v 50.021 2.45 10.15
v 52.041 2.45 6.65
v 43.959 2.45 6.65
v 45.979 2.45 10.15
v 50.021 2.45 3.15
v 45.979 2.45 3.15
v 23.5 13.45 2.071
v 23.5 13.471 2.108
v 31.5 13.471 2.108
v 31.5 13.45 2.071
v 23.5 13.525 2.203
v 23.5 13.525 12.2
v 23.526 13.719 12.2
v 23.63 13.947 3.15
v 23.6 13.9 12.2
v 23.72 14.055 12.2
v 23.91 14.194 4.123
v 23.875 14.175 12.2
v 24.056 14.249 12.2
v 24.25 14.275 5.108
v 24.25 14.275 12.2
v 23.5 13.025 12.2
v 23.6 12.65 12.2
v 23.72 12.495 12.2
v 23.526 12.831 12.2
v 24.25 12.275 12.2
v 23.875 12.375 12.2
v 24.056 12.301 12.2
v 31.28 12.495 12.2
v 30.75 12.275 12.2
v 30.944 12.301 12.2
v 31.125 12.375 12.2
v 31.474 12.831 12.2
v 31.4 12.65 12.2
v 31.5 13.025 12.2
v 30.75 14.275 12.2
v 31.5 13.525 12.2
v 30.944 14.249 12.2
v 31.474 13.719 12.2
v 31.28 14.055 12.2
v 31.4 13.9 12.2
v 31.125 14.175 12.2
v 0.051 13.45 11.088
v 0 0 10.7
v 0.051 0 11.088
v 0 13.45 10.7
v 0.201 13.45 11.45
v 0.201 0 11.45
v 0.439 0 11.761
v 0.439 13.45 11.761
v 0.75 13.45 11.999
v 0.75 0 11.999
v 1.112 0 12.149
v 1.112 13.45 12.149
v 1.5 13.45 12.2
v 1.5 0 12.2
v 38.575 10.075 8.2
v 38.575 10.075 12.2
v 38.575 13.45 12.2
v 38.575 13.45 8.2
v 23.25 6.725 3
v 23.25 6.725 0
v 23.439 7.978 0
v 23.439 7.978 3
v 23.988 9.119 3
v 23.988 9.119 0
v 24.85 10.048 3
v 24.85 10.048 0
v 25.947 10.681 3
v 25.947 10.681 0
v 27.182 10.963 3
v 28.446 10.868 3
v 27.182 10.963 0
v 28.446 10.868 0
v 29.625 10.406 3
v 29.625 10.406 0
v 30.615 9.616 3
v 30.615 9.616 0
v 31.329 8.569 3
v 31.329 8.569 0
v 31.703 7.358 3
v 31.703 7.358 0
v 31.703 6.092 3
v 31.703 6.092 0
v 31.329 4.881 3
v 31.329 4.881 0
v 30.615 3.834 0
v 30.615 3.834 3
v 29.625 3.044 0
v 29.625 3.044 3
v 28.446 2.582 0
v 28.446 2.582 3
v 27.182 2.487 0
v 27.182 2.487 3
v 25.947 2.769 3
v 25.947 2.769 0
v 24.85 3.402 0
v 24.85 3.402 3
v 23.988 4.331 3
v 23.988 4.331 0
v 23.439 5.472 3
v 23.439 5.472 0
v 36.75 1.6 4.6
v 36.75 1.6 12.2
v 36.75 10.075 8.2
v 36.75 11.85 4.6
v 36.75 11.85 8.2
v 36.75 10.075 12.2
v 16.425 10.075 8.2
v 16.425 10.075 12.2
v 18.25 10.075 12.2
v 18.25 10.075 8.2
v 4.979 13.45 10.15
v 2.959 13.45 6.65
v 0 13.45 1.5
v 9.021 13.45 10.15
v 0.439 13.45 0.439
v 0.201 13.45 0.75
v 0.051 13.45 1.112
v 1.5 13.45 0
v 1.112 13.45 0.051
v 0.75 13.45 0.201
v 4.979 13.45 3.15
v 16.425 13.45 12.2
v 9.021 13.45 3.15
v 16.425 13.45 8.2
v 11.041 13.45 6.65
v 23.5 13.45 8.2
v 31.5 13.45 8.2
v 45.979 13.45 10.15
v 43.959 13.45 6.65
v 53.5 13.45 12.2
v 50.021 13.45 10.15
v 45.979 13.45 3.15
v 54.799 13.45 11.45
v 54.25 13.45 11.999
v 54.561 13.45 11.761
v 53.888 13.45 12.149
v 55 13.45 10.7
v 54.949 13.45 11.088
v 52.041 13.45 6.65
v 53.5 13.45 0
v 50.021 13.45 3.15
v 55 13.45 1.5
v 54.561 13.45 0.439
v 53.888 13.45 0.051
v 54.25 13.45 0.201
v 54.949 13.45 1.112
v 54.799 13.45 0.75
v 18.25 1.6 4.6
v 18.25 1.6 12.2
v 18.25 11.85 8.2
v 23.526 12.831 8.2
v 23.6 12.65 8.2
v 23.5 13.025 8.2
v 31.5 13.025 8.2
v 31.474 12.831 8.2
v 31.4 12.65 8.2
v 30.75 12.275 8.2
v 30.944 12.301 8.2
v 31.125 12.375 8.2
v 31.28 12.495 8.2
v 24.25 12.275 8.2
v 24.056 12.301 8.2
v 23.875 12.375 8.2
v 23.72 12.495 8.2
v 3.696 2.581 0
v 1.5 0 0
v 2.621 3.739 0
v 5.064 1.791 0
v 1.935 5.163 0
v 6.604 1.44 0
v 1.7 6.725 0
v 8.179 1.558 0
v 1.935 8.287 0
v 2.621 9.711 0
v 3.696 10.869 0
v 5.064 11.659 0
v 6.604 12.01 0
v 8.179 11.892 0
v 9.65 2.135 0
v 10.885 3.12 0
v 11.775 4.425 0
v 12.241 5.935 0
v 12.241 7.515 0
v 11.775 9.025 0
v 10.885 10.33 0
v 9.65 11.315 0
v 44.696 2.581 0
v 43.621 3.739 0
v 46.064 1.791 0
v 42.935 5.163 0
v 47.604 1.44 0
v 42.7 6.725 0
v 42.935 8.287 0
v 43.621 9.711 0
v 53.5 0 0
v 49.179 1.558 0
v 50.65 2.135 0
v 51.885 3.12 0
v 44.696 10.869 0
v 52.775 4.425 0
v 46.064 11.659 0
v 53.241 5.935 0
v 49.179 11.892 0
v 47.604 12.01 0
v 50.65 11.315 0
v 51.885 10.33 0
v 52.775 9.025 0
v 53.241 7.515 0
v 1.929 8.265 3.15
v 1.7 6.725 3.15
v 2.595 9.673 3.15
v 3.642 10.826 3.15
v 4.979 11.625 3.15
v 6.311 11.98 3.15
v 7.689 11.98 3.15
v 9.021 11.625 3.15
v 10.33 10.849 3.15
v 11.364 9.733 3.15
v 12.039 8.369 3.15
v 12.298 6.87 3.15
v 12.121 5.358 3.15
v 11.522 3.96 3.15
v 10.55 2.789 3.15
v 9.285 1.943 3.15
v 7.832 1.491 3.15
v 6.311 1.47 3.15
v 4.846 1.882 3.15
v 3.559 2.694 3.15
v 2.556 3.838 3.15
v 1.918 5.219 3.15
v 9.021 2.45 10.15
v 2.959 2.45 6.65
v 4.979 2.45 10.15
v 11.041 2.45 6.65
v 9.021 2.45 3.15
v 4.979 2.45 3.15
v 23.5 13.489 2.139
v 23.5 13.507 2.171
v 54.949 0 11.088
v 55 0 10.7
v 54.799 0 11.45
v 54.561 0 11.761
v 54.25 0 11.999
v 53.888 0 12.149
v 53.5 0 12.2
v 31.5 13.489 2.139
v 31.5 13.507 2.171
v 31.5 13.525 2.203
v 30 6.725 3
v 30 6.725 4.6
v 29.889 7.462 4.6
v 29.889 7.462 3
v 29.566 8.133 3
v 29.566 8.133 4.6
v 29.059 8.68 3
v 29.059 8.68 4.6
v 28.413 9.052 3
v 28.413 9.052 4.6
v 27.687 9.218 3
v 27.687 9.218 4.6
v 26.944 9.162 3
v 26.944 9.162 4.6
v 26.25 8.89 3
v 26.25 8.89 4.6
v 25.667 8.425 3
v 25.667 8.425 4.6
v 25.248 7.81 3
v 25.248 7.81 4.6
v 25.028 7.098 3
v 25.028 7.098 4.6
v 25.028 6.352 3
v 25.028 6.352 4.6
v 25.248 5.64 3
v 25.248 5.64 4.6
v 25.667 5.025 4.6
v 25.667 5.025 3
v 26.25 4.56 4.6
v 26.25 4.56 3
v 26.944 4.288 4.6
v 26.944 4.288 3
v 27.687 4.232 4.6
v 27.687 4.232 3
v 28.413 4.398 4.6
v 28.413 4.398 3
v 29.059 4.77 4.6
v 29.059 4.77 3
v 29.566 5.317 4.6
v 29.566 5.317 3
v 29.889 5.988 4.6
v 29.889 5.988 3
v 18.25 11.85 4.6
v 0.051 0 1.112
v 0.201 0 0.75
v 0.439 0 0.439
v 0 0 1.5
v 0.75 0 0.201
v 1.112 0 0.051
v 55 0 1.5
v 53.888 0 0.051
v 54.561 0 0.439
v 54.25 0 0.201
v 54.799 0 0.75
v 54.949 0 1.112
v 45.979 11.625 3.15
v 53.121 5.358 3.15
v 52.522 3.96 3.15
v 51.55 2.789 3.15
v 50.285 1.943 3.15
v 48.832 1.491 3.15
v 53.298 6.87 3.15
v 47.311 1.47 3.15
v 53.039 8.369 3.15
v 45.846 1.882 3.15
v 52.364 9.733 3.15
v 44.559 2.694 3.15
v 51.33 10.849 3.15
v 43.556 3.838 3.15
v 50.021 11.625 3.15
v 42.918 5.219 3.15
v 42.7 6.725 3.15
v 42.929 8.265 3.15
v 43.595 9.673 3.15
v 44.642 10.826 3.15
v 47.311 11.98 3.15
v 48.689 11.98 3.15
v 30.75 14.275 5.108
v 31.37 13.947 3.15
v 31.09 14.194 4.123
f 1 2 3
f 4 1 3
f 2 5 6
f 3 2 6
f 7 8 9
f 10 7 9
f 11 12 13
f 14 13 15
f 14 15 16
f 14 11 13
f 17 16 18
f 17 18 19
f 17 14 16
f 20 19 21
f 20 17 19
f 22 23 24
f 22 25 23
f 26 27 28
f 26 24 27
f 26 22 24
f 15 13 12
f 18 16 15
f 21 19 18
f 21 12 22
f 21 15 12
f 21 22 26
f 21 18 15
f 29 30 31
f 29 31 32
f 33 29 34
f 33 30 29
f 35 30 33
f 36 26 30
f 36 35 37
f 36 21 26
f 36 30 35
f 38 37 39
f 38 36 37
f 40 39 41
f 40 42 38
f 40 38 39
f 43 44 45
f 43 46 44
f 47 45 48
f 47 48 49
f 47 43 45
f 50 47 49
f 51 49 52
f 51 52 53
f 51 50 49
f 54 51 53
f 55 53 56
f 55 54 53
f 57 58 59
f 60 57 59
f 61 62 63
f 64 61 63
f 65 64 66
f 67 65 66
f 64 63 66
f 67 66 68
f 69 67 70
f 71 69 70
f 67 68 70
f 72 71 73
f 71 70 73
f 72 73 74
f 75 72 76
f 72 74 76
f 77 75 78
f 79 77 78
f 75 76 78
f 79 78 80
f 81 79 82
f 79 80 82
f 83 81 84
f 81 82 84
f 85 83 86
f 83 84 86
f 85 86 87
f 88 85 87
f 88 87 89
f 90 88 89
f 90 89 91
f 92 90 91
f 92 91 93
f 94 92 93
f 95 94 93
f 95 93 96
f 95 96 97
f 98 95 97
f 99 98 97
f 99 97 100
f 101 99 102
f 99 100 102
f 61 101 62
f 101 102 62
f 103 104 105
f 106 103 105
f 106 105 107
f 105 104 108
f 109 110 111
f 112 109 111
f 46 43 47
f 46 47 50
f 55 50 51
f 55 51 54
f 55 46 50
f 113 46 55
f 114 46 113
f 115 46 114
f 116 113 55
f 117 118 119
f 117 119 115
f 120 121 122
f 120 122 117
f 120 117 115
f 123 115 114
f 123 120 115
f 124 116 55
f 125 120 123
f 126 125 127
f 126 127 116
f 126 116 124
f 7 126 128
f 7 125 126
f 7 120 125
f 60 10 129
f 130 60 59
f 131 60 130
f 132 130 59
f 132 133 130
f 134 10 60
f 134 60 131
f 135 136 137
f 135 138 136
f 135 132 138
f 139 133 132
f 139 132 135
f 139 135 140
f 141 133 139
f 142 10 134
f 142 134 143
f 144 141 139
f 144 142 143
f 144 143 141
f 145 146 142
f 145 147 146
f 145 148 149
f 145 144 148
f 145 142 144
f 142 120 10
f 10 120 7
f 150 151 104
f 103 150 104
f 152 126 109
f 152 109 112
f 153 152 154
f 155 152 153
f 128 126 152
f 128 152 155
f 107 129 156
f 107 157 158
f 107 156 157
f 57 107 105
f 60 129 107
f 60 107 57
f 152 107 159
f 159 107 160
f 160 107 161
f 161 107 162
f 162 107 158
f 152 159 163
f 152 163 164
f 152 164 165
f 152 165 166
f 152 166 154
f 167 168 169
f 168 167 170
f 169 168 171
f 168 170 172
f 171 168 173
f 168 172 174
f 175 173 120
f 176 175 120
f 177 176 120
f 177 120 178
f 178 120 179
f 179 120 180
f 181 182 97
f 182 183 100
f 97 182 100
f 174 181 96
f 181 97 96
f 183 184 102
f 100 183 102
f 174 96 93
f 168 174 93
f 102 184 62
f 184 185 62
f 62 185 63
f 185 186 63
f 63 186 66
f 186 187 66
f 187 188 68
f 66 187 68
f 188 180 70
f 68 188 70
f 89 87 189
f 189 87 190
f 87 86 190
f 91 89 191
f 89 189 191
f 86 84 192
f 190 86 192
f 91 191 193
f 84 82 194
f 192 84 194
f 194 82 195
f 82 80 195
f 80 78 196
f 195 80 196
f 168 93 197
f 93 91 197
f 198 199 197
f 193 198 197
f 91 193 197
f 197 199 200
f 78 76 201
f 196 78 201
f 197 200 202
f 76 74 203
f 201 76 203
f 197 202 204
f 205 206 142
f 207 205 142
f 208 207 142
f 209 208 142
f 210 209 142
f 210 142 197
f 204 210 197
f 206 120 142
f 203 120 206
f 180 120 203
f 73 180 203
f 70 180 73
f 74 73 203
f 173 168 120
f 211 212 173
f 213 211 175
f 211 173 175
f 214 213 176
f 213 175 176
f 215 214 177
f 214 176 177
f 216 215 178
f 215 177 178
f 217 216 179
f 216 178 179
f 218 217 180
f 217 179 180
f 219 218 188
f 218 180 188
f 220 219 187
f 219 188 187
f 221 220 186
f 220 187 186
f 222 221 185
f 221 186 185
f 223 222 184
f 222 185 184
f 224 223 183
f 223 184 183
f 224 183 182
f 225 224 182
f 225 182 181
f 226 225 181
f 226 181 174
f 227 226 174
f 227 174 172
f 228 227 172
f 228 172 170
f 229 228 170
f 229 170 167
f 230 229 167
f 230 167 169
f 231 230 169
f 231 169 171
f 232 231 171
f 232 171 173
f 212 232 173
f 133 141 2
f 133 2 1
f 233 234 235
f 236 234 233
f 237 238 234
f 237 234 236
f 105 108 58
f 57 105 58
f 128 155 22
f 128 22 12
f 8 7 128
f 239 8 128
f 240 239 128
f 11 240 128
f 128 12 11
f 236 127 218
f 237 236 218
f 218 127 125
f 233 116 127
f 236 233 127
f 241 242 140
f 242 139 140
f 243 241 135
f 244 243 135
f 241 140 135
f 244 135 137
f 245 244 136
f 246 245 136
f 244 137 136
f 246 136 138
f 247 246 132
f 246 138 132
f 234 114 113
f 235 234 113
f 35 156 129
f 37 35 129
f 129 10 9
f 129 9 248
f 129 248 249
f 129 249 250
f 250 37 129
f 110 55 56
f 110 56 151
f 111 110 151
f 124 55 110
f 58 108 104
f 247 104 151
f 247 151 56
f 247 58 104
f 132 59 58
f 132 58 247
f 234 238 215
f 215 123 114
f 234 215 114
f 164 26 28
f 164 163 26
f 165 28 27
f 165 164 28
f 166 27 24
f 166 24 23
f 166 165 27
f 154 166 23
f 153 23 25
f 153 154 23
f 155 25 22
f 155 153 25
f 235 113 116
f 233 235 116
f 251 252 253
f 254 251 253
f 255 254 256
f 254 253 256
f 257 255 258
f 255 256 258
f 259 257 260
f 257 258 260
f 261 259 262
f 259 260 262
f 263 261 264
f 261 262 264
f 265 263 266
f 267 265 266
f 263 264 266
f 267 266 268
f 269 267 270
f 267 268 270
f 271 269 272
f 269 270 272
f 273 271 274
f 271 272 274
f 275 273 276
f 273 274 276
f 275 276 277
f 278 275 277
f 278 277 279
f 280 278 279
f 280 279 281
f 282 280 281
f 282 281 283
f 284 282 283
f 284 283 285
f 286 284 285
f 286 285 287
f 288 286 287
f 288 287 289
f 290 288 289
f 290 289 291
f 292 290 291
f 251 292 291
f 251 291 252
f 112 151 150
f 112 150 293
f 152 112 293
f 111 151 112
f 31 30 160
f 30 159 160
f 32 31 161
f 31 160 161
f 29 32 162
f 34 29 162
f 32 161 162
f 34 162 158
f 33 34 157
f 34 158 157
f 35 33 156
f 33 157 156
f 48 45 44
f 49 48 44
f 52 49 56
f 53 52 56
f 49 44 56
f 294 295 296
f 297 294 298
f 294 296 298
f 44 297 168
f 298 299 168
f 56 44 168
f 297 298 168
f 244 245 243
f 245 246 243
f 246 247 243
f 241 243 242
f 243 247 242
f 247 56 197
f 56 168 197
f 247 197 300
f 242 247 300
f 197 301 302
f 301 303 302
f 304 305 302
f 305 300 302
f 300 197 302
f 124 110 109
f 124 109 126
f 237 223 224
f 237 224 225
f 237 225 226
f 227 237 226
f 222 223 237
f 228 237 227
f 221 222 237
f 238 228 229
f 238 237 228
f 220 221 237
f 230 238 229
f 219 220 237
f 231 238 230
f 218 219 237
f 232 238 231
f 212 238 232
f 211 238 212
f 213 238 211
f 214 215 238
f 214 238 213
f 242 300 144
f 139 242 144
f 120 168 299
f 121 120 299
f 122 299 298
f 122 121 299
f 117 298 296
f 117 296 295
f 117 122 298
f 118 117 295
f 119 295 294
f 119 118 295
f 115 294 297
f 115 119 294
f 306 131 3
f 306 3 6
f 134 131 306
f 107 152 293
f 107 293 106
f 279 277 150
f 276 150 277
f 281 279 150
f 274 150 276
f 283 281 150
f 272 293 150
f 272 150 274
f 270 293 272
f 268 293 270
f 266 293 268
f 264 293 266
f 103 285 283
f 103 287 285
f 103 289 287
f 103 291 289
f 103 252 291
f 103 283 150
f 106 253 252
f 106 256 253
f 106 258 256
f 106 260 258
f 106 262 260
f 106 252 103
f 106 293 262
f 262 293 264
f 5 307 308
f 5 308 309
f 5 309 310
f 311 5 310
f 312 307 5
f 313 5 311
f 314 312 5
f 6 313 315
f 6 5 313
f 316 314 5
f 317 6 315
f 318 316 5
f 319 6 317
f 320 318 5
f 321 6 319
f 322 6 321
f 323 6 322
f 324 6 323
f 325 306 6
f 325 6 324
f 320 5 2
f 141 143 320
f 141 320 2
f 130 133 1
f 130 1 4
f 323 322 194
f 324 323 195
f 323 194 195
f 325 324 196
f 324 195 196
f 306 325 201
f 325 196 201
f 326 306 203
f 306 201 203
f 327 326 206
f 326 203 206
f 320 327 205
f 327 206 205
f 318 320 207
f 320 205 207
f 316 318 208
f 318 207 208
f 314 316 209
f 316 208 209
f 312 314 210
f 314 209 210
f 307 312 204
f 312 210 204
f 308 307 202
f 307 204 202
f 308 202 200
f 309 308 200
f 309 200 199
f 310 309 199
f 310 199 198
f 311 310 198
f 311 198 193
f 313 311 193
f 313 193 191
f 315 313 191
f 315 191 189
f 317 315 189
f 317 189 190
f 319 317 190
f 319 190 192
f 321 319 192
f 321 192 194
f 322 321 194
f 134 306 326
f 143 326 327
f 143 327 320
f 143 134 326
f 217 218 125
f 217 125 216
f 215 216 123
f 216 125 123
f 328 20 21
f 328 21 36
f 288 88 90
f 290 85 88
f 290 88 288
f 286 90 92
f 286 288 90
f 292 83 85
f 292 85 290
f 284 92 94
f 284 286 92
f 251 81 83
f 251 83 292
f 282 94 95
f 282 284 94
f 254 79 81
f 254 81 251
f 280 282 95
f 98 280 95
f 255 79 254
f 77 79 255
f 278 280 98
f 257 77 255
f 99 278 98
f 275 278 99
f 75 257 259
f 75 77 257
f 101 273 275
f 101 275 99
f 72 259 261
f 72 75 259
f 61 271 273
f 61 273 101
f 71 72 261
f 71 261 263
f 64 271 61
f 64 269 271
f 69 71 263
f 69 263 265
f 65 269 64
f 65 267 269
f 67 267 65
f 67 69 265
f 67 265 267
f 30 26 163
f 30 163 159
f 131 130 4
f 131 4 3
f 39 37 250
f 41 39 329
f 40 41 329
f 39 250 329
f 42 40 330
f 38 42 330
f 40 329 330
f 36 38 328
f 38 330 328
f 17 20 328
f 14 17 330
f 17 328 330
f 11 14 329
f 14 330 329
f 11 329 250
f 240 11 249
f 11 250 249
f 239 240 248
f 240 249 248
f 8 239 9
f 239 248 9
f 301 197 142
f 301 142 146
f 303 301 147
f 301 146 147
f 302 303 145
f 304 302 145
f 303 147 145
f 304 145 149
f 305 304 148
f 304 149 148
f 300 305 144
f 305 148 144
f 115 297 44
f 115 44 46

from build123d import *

# Parameters (mm, degrees)
SKETCH2_W           = 55
SKETCH2_H           = 13.45
BOSS_EXTRUDE1_DEPTH = 12.2
SKETCH3_W           = 18.5
SKETCH3_H           = 10.25
CUT_EXTRUDE1_DEPTH  = 7.6
SKETCH5_W           = 22.15
SKETCH5_H           = 1.6
CUT_EXTRUDE2_DEPTH  = 4
SKETCH6_W           = 8
SKETCH6_H           = 2
BOSS_EXTRUDE2_DEPTH = 8.7
SKETCH7_W           = 1.825
SKETCH7_H           = 3.375
CUT_EXTRUDE3_DEPTH  = 4
FILLET1_R           = 0.75
FILLET3_R           = 0.75
DRAFT4_ANGLE        = 60
FILLET5_R           = 6
SKETCH8_R           = 2.5
CUT_EXTRUDE4_DEPTH  = 58.328314378
SKETCH9_R           = 4.25
CUT_EXTRUDE5_DEPTH  = 3
SKETCH10_R          = 5.3
CUT_EXTRUDE6_DEPTH  = 3.15
CUT_EXTRUDE7_DEPTH  = 11
FILLET6_R           = 1.5


with BuildPart() as part:
    # Sketch2 → Boss-Extrude1 (new body)
    with BuildSketch(Plane.XY):
        with Locations((27.5, 6.725)):
            Rectangle(SKETCH2_W, SKETCH2_H)
    extrude(amount=BOSS_EXTRUDE1_DEPTH)

    # Sketch3 → Cut-Extrude1 (cut)
    with BuildSketch(Plane.XY.offset(12.2)):
        with Locations((27.5, 6.725)):
            Rectangle(SKETCH3_W, SKETCH3_H)
    extrude(amount=-CUT_EXTRUDE1_DEPTH, mode=Mode.SUBTRACT)

    # Sketch5 → Cut-Extrude2 (cut)
    with BuildSketch(Plane.XY.offset(12.2)):
        with Locations((27.5, 12.65)):
            Rectangle(SKETCH5_W, SKETCH5_H)
    extrude(amount=-CUT_EXTRUDE2_DEPTH, mode=Mode.SUBTRACT)

    # Sketch6 → Boss-Extrude2 (add)
    with BuildSketch(Plane.XY.offset(12.2)):
        with Locations((27.5, 13.275)):
            Rectangle(SKETCH6_W, SKETCH6_H)
    extrude(amount=-BOSS_EXTRUDE2_DEPTH)

    # Sketch7 → Cut-Extrude3 (cut)
    with BuildSketch(Plane.XY.offset(12.2)):
        with Locations((37.6625, 11.7625)):
            Rectangle(SKETCH7_W, SKETCH7_H)
        with Locations((17.3375, 11.7625)):
            Rectangle(SKETCH7_W, SKETCH7_H)
    extrude(amount=-CUT_EXTRUDE3_DEPTH, mode=Mode.SUBTRACT)

    # Fillet1
    fillet1_edges = [part.edges().sort_by_distance(p)[0] for p in [
        (31.5, 14.275, 7.85),
        (31.5, 12.275, 10.2),
    ]]
    fillet(fillet1_edges, radius=FILLET1_R)

    # Fillet3
    fillet3_edges = [part.edges().sort_by_distance(p)[0] for p in [
        (23.5, 12.275, 10.2),
        (23.5, 14.275, 7.85),
    ]]
    fillet(fillet3_edges, radius=FILLET3_R)

    # Draft4
    draft4_faces = [part.faces().sort_by_distance(p)[0] for p in [
        (27.5, 13.853198642, 3.5),
    ]]
    draft(draft4_faces, Plane(origin=(23.5, 14.275, 3.5), x_dir=(0, 0, 1), z_dir=(0, 1, 0)), DRAFT4_ANGLE)

    # Fillet5
    # the kernel refuses this fillet: 6 mm, written as the material it takes off along each edge
    with BuildSketch(Plane(origin=(34.769237886, 14.275, 3.5), x_dir=(0, -0.49999999999999784, -0.8660254037844399), z_dir=(-1, 0, 0))) as fillet5_piece_1:
        with BuildLine():
            CenterArc((FILLET5_R * 0.267949192431, FILLET5_R), FILLET5_R, 240, 30)
            Line((-FILLET5_R * 0.232050807569, FILLET5_R * 0.133974596216), (0, 0))
            Line((0, 0), (FILLET5_R * 0.267949192431, 0))
        make_face()
    extrude(amount=14.538475773, mode=Mode.SUBTRACT)

    # Sketch8 → Cut-Extrude4 (cut, through all)
    with BuildSketch(Plane.XY.offset(4.6)):
        with Locations((27.5, 6.725)):
            Circle(SKETCH8_R)
    extrude(amount=-CUT_EXTRUDE4_DEPTH, mode=Mode.SUBTRACT)

    # Sketch9 → Cut-Extrude5 (cut)
    with BuildSketch(Plane(origin=(0, 0, 0), x_dir=(-1, 0, 0), z_dir=(0, 0, -1))):
        with Locations((-27.5, 6.725)):
            Circle(SKETCH9_R)
    extrude(amount=-CUT_EXTRUDE5_DEPTH, mode=Mode.SUBTRACT)

    # Sketch10 → Cut-Extrude6 (cut)
    with BuildSketch(Plane(origin=(0, 0, 0), x_dir=(-1, 0, 0), z_dir=(0, 0, -1))):
        with Locations((-48, 6.725)):
            Circle(SKETCH10_R)
        with Locations((-7, 6.725)):
            Circle(SKETCH10_R)
    extrude(amount=-CUT_EXTRUDE6_DEPTH, mode=Mode.SUBTRACT)

    # Sketch11 → Cut-Extrude7 (cut)
    with BuildSketch(Plane(origin=(0, 13.45, 0), x_dir=(1, 0, 0), z_dir=(0, 1, 0))):
        Polygon((9.020725942, -3.15), (4.979274058, -3.15), (2.958548116, -6.65), (4.979274058, -10.15), (9.020725942, -10.15), (11.041451884, -6.65), align=None)
        Polygon((43.958548116, -6.65), (45.979274058, -3.15), (50.020725942, -3.15), (52.041451884, -6.65), (50.020725942, -10.15), (45.979274058, -10.15), align=None)
    extrude(amount=-CUT_EXTRUDE7_DEPTH, mode=Mode.SUBTRACT)

    # Fillet6
    fillet6_edges = [part.edges().sort_by_distance(p)[0] for p in [
        (55, 6.725, 12.2),
        (0, 6.725, 12.2),
        (55, 6.725, 0),
        (0, 6.725, 0),
    ]]
    fillet(fillet6_edges, radius=FILLET6_R)


solid = part.part
